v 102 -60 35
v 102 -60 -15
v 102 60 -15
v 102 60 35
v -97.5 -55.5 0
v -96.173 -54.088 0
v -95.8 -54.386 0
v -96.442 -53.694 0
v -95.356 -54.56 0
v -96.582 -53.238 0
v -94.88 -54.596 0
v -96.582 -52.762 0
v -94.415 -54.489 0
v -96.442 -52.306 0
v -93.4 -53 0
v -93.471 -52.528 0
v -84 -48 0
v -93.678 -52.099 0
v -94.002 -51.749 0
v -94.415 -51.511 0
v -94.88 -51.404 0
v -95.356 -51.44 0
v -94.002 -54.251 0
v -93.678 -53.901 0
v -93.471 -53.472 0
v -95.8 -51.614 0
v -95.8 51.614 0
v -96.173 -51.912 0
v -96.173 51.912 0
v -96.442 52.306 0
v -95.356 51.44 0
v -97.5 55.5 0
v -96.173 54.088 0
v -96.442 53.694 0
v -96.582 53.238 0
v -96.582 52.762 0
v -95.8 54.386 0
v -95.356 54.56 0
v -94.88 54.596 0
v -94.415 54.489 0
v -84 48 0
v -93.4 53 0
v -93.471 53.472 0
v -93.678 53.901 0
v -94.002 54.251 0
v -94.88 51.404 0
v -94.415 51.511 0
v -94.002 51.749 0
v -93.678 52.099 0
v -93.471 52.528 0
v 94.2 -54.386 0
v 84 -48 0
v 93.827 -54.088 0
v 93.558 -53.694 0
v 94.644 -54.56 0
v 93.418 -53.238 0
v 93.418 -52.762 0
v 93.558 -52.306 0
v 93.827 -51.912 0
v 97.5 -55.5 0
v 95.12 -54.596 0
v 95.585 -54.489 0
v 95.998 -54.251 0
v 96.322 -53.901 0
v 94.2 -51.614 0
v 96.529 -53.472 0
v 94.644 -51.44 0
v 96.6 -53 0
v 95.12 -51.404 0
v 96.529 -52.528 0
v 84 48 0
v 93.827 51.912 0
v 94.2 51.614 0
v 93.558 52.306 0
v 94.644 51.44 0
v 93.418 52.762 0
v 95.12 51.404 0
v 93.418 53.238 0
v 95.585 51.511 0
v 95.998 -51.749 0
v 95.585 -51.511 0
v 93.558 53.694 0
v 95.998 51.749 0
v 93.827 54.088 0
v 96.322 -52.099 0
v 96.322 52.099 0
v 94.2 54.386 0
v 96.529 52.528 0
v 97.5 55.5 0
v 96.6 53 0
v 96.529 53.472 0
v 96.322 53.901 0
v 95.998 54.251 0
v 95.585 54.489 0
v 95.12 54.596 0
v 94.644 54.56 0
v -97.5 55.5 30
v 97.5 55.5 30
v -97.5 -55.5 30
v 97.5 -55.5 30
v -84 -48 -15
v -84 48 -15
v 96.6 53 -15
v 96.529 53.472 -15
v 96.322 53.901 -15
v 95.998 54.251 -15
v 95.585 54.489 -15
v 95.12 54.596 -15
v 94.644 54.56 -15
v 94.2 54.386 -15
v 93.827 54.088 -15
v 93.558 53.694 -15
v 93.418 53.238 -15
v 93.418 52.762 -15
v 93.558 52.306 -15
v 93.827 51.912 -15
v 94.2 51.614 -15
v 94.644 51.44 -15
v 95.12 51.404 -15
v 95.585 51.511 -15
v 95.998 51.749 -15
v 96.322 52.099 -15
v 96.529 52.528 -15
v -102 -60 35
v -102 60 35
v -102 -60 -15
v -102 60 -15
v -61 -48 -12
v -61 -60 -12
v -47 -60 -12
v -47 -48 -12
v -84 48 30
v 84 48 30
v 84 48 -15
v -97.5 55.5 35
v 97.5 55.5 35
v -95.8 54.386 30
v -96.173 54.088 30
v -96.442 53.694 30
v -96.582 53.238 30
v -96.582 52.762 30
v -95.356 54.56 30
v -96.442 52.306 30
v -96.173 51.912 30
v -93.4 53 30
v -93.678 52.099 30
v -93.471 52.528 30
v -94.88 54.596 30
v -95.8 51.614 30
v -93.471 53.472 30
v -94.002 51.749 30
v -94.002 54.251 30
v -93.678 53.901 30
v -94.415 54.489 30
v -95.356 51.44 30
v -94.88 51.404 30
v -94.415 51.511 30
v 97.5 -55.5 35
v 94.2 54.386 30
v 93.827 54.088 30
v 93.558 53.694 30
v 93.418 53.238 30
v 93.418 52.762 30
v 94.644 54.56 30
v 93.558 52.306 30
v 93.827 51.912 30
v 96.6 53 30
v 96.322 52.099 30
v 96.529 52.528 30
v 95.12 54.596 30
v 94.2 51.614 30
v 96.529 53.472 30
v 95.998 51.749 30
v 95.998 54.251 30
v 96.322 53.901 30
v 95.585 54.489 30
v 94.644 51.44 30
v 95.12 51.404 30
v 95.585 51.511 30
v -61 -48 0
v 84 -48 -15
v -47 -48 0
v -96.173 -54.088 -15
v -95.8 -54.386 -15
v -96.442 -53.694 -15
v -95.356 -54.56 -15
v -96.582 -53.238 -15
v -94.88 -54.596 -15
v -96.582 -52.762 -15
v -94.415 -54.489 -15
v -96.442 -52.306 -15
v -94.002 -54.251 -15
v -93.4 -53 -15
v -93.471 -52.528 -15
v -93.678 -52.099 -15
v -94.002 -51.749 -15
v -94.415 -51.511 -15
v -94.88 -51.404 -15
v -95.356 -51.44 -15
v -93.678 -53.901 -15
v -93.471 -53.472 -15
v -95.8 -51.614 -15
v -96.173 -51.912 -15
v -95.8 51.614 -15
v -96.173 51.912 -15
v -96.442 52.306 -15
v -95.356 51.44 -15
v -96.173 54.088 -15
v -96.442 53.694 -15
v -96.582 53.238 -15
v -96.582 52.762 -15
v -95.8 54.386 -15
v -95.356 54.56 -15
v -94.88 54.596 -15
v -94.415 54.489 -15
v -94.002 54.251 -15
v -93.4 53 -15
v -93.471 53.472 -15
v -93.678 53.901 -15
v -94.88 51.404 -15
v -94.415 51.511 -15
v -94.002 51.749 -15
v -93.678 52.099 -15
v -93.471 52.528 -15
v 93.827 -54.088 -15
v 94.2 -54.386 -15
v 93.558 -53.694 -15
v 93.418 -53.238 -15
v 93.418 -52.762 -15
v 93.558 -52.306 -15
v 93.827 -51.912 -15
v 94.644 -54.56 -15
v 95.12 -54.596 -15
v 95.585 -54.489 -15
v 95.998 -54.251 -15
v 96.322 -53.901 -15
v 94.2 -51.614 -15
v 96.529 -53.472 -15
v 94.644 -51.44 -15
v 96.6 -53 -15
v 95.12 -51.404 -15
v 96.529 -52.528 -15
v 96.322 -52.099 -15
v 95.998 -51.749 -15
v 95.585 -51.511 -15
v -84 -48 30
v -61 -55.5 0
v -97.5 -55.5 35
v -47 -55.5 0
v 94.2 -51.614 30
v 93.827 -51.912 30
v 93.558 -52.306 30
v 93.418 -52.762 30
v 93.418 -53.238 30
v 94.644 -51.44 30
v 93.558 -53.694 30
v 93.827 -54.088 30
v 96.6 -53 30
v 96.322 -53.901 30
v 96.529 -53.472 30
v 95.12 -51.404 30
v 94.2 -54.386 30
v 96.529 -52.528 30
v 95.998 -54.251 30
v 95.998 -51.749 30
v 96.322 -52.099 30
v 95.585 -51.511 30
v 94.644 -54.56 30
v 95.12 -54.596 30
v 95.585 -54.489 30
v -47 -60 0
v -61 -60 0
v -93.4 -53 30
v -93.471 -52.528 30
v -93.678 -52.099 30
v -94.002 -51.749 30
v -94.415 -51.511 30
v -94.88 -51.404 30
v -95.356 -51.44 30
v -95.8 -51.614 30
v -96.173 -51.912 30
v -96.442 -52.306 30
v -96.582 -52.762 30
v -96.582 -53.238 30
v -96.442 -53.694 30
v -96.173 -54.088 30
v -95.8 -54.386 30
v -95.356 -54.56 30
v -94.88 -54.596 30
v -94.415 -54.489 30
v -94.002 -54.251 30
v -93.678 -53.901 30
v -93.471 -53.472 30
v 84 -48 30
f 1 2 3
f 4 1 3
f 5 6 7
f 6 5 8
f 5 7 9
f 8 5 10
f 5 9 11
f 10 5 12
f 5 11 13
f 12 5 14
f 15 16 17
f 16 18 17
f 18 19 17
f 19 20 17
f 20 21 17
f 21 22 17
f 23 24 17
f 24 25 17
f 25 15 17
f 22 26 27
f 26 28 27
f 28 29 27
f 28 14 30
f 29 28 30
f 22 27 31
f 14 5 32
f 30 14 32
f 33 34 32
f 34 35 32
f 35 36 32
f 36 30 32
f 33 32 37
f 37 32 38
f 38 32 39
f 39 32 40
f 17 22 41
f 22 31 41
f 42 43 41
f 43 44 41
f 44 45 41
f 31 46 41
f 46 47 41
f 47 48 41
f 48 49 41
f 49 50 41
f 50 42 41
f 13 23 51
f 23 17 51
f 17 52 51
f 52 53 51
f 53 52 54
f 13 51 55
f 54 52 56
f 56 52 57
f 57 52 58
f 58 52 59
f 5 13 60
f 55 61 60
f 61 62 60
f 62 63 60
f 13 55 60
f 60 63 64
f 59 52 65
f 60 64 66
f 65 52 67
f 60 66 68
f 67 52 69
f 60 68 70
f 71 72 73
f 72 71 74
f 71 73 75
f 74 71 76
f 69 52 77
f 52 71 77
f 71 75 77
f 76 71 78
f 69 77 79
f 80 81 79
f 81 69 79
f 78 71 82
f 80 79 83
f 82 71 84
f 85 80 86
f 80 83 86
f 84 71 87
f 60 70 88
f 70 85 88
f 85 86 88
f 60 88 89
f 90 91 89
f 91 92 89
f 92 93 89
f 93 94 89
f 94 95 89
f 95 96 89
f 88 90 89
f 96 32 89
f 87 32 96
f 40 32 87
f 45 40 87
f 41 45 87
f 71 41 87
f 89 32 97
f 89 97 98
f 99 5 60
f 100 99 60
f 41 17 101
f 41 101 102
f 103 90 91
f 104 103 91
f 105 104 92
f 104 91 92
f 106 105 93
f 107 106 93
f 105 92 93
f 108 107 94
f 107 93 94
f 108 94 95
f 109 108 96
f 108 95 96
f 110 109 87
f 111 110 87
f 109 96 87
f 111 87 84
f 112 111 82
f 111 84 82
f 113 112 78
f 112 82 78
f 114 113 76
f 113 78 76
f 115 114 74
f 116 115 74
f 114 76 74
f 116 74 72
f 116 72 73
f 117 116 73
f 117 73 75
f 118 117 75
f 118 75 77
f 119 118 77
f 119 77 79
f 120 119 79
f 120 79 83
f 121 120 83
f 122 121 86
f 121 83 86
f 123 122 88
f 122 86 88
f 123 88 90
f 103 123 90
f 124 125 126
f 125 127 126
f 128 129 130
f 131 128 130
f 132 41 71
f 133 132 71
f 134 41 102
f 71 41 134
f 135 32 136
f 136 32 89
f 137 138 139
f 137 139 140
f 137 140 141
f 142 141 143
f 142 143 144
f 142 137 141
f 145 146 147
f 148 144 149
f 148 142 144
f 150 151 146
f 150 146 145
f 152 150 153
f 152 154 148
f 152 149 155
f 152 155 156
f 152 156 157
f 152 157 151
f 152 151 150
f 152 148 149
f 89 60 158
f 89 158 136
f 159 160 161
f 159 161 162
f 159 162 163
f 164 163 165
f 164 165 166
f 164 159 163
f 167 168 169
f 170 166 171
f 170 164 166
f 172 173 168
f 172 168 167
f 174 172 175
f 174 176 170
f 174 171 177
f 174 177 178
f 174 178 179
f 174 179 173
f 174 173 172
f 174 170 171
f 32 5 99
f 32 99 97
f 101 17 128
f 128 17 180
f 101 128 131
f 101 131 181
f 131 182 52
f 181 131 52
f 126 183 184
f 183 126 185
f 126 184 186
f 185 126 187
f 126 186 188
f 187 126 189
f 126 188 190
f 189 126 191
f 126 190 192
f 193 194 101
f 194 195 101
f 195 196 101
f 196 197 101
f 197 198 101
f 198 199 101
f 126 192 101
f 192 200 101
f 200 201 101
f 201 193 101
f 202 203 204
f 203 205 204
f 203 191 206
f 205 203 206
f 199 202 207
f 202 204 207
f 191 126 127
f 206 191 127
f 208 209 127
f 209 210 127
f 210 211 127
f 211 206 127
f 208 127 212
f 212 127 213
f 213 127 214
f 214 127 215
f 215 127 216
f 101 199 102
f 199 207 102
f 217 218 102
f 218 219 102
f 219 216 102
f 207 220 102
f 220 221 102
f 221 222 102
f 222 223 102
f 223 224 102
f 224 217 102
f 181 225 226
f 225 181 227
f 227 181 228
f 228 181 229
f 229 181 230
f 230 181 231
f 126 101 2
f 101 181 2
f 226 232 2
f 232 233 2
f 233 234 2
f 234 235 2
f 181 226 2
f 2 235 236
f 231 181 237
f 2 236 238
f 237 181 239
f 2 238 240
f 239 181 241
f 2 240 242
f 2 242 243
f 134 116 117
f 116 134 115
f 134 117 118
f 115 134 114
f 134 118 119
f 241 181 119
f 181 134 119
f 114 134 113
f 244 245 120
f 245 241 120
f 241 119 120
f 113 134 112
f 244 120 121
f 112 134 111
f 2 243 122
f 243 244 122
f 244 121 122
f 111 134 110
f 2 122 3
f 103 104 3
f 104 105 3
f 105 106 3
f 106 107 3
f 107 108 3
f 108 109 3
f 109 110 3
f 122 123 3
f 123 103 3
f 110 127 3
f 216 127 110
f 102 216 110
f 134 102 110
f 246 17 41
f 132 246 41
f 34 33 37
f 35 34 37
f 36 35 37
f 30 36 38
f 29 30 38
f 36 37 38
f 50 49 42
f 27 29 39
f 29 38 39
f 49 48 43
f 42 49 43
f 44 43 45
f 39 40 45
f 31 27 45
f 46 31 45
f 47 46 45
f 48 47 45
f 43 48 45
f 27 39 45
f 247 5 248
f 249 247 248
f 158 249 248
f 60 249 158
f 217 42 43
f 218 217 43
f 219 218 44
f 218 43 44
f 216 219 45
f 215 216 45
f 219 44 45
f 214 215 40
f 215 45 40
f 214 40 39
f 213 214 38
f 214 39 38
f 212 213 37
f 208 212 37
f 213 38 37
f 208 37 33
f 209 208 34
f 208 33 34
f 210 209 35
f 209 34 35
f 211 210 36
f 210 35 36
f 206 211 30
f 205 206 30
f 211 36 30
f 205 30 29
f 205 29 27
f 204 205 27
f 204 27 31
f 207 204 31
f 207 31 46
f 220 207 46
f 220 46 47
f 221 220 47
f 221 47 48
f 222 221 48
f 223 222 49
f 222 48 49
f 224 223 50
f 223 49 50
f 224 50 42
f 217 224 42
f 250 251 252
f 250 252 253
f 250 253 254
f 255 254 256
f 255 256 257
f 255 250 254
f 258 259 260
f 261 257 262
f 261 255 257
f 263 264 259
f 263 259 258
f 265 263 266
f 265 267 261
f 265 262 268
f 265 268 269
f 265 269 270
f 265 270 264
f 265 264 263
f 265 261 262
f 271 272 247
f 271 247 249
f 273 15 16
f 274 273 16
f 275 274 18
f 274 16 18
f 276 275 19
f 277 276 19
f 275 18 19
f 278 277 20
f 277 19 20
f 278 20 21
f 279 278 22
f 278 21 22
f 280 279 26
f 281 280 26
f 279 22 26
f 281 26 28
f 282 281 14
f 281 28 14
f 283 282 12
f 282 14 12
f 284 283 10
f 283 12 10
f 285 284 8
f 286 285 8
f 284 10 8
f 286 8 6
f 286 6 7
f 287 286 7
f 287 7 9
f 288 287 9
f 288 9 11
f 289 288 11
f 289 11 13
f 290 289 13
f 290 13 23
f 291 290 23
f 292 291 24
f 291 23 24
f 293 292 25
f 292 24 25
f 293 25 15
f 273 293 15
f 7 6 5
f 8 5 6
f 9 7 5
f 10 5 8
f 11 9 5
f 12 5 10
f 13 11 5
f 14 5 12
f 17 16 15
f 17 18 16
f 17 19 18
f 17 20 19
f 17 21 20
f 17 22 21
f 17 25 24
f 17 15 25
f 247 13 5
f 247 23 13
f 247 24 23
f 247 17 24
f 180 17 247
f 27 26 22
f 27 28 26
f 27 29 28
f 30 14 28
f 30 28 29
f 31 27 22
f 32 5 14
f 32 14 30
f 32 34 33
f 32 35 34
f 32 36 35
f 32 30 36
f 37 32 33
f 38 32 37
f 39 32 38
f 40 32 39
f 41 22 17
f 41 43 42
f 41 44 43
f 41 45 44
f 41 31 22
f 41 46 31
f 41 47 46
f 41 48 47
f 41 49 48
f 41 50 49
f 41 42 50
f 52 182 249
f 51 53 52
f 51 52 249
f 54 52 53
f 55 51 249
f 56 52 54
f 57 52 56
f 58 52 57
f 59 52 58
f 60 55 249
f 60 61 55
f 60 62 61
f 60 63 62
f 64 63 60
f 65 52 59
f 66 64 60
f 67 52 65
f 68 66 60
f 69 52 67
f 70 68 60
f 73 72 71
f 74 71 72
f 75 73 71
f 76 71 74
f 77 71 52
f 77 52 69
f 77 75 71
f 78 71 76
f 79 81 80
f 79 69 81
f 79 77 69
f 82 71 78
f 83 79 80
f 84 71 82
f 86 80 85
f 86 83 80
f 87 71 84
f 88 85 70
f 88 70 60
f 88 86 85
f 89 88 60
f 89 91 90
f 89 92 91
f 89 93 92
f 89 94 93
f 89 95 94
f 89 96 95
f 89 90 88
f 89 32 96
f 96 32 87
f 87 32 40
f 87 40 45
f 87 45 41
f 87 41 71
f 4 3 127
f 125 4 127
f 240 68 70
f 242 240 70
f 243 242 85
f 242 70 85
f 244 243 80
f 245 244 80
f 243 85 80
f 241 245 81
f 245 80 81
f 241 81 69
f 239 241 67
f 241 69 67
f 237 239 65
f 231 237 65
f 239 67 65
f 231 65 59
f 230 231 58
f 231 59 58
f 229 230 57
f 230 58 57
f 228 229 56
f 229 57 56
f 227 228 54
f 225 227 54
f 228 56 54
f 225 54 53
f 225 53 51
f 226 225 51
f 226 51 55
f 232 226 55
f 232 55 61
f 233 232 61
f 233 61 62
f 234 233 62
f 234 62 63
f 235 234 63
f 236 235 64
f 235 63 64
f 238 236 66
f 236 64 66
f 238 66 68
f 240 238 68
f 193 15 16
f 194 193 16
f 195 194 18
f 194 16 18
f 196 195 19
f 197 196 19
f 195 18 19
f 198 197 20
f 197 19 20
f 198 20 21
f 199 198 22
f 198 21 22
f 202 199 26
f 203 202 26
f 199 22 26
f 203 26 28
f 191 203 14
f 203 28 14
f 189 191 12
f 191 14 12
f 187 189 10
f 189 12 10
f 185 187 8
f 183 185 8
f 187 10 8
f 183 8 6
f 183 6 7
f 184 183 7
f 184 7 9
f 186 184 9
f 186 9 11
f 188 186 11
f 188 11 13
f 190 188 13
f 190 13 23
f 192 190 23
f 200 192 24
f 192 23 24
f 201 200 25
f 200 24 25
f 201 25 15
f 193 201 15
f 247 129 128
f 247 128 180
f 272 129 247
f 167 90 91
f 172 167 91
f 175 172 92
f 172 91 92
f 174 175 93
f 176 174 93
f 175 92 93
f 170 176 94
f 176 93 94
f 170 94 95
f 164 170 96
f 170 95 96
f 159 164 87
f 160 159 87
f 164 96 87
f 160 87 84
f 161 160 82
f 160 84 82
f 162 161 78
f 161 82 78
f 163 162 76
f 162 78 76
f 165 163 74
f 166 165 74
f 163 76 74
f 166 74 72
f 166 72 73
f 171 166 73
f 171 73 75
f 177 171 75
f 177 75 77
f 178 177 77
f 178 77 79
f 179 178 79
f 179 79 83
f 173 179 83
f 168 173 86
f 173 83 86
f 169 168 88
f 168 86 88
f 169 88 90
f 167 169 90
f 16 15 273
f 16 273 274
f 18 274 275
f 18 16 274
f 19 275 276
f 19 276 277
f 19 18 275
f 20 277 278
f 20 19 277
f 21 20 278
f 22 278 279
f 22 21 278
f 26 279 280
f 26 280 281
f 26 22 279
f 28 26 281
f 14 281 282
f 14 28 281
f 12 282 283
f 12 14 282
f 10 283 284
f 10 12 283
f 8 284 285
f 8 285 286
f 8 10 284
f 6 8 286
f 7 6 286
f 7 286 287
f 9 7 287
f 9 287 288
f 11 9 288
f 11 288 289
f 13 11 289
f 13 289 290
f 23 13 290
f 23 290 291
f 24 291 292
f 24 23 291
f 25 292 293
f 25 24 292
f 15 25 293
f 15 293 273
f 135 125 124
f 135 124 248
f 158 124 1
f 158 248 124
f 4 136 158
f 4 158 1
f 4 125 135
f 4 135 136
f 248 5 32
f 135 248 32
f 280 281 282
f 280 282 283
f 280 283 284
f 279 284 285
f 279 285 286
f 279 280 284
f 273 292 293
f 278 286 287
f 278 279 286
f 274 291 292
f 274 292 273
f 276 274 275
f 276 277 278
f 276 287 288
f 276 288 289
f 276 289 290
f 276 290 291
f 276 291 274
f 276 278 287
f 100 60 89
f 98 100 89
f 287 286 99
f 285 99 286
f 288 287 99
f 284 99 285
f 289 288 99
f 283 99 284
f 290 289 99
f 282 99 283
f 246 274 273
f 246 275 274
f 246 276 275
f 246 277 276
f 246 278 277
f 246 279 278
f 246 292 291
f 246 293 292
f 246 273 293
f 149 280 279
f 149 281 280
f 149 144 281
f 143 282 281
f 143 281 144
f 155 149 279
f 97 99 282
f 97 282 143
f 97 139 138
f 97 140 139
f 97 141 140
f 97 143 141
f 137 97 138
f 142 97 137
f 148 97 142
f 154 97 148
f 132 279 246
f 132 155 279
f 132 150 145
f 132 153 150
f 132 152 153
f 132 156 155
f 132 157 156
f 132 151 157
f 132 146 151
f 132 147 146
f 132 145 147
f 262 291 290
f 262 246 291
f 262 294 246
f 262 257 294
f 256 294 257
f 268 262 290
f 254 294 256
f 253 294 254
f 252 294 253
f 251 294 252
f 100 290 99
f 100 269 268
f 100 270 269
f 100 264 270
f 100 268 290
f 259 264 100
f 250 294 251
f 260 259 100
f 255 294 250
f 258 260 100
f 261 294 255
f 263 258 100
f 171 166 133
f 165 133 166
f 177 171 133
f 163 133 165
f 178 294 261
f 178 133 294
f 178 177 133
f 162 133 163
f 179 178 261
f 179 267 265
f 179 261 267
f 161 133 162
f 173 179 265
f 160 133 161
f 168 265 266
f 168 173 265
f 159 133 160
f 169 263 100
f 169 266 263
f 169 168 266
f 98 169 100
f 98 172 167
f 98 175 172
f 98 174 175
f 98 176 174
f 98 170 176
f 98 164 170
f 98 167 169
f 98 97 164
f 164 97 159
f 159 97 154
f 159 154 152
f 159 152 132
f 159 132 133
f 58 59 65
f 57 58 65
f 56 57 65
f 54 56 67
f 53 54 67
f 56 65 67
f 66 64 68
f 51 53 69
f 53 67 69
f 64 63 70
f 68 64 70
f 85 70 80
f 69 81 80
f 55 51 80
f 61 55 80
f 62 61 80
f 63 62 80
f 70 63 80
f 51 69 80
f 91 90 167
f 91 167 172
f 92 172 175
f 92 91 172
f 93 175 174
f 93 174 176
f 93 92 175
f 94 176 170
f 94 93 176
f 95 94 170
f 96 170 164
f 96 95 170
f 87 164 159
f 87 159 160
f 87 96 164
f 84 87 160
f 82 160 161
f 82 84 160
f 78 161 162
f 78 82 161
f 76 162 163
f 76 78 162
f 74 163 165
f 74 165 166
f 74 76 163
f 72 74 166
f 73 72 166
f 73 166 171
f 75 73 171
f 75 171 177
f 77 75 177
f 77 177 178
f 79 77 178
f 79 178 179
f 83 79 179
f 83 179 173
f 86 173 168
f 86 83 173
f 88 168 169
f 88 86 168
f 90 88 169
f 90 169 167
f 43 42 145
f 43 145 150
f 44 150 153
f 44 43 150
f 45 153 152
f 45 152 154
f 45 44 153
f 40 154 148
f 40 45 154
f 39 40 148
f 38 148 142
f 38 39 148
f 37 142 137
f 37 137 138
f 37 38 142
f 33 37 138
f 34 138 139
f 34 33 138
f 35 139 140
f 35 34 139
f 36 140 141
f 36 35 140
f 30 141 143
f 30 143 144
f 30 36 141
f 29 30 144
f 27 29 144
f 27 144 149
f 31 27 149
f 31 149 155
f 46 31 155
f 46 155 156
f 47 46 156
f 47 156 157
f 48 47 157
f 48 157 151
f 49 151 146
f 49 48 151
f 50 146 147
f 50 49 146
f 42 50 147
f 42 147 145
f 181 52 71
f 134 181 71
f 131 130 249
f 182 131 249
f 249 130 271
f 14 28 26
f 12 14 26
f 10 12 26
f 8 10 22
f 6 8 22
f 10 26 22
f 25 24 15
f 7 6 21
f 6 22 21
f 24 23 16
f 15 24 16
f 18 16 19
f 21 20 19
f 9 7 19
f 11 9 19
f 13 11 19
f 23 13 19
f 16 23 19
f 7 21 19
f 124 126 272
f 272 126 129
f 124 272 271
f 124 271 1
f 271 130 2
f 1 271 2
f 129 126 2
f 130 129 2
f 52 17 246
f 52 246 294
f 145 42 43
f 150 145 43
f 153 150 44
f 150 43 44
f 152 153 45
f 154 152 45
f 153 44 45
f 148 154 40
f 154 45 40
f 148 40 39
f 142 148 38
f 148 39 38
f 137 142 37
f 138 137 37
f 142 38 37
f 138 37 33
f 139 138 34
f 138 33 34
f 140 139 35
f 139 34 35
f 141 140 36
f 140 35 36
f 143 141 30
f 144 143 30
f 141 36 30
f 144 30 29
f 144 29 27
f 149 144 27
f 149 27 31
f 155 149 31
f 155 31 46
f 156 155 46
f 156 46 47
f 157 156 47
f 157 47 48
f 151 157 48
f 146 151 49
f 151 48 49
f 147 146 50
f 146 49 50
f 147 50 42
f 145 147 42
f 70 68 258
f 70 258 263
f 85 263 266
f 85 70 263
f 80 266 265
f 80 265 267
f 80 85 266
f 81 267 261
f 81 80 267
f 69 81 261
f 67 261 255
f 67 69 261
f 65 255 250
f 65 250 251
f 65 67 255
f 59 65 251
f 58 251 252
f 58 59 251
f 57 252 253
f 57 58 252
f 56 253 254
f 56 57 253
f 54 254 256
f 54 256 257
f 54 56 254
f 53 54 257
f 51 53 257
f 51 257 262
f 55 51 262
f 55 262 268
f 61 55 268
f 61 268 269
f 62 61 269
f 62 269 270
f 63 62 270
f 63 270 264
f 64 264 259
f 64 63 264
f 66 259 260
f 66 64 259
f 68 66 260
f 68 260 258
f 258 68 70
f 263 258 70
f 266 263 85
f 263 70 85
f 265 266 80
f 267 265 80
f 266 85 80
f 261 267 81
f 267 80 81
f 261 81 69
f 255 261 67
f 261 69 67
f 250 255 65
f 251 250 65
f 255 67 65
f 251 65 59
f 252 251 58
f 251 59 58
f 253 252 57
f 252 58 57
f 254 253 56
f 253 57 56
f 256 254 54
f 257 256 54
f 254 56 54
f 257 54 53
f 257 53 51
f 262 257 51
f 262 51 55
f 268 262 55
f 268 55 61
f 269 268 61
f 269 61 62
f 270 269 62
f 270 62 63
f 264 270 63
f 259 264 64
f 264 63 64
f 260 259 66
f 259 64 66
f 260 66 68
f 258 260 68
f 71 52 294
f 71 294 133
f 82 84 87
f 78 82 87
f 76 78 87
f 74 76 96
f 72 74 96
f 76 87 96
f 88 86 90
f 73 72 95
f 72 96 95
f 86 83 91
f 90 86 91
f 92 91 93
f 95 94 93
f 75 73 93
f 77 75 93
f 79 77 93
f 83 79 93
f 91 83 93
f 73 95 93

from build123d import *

# Parameters (mm, degrees)
F0_W      = 195
F0_H      = 111
F1_DEPTH  = 15
F0_R      = 1.6
F0_W_2    = 168
F0_H_2    = 96
F2_DEPTH  = 15
F3_DEPTH  = 35
F4_DEPTH  = 30
F5_DEPTH  = 30
F6_DEPTH  = 30
F7_DEPTH  = 30
F8_DEPTH  = 30
F9_W      = 14
F9_H      = 12
F10_DEPTH = 25


with BuildPart() as f1:
    # F0 (on Top) → F1 (new body)
    with BuildSketch(Plane.XY):
        Polygon((102, 53), (102, 60), (95, 60), (-95, 60), (-102, 60), (-102, 53), (-102, -53), (-102, -60), (-95, -60), (95, -60), (102, -60), (102, -53), align=None)
        Rectangle(F0_W, F0_H, mode=Mode.SUBTRACT)
    extrude(amount=-F1_DEPTH)

    # F0 (on Top) → F2 (join)
    with BuildSketch(Plane.XY):
        Rectangle(F0_W, F0_H)
        with Locations((-95, -53)):
            Circle(F0_R, mode=Mode.SUBTRACT)
        with Locations((95, -53)):
            Circle(F0_R, mode=Mode.SUBTRACT)
        with Locations((-95, 53)):
            Circle(F0_R, mode=Mode.SUBTRACT)
        Rectangle(F0_W_2, F0_H_2, mode=Mode.SUBTRACT)
        with Locations((95, 53)):
            Circle(F0_R, mode=Mode.SUBTRACT)
    extrude(amount=-F2_DEPTH)

    # F0 (on Top) → F3 (join)
    with BuildSketch(Plane.XY):
        Polygon((102, 53), (102, 60), (95, 60), (-95, 60), (-102, 60), (-102, 53), (-102, -53), (-102, -60), (-95, -60), (95, -60), (102, -60), (102, -53), align=None)
        Rectangle(F0_W, F0_H, mode=Mode.SUBTRACT)
    extrude(amount=F3_DEPTH)

    # F9 (on face) → F10 (cut)
    with BuildSketch(Plane.XZ.offset(60)):
        with Locations((-54, -6)):
            Rectangle(F9_W, F9_H)
    extrude(amount=-F10_DEPTH, mode=Mode.SUBTRACT)


with BuildPart() as f4:
    # F0 (on Top) → F4 (new body)
    with BuildSketch(Plane.XY):
        with Locations((95, 53)):
            Circle(F0_R)
    extrude(amount=F4_DEPTH)


with BuildPart() as f5:
    # F0 (on Top) → F5 (new body)
    with BuildSketch(Plane.XY):
        with Locations((-95, 53)):
            Circle(F0_R)
    extrude(amount=F5_DEPTH)


with BuildPart() as f6:
    # F0 (on Top) → F6 (new body)
    with BuildSketch(Plane.XY):
        with Locations((95, -53)):
            Circle(F0_R)
    extrude(amount=F6_DEPTH)


with BuildPart() as f7:
    # F0 (on Top) → F7 (new body)
    with BuildSketch(Plane.XY):
        with Locations((-95, -53)):
            Circle(F0_R)
    extrude(amount=F7_DEPTH)


with BuildPart() as f8:
    # F0 (on Top) → F8 (new body)
    with BuildSketch(Plane.XY):
        Rectangle(F0_W, F0_H)
        with Locations((-95, -53)):
            Circle(F0_R, mode=Mode.SUBTRACT)
        with Locations((95, -53)):
            Circle(F0_R, mode=Mode.SUBTRACT)
        with Locations((-95, 53)):
            Circle(F0_R, mode=Mode.SUBTRACT)
        Rectangle(F0_W_2, F0_H_2, mode=Mode.SUBTRACT)
        with Locations((95, 53)):
            Circle(F0_R, mode=Mode.SUBTRACT)
    extrude(amount=F8_DEPTH)


solid = Compound([f1.part, f4.part, f5.part, f6.part, f7.part, f8.part])
